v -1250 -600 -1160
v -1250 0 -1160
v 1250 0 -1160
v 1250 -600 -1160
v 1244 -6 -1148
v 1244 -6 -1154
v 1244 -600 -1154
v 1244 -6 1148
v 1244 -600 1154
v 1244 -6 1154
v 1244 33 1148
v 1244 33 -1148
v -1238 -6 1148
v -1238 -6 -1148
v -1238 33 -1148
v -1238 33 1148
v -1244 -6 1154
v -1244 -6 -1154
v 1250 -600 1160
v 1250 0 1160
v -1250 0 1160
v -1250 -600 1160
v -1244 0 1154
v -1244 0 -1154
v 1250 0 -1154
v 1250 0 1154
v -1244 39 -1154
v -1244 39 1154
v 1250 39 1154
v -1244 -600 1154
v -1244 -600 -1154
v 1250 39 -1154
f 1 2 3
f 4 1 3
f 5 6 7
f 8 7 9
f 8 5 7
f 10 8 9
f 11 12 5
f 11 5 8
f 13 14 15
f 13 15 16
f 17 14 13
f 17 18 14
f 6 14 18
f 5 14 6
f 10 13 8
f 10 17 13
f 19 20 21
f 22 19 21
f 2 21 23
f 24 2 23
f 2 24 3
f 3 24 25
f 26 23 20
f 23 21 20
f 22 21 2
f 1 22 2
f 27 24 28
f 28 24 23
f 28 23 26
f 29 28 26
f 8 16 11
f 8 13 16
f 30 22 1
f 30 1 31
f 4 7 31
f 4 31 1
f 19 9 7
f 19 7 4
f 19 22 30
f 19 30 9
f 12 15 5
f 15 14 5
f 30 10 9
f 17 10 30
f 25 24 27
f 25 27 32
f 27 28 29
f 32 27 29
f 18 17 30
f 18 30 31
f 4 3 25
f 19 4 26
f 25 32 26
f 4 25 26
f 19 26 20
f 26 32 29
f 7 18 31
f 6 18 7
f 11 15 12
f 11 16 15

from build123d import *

# Parameters (mm, degrees)
F2_DEPTH = 6
F3_W     = 2494
F3_H     = 2308
F4_DEPTH = 45
F5_DEPTH = 600
F6_T     = -6


with BuildPart() as f2:
    # F0 (on Front) → F2 (new body)
    with BuildSketch(Plane.XZ):
        Polygon((-1250, 1160), (-1250, 677.0832676902), (-1250, -677.0832676902), (-1250, -1160), (1250, -1160), (1250, -677.0832676902), (1250, 677.0832676902), (1250, 1160), align=None)
    extrude(amount=F2_DEPTH)

    # F3 (on face) → F4 (join)
    with BuildSketch(Plane.XZ.offset(6)):
        with Locations((3, 0)):
            Rectangle(F3_W, F3_H)
    extrude(amount=-F4_DEPTH)

    # F0 (on Front) → F5 (join)
    with BuildSketch(Plane.XZ):
        Polygon((-1250, 1160), (-1250, 677.0832676902), (-1250, -677.0832676902), (-1250, -1160), (1250, -1160), (1250, -677.0832676902), (1250, 677.0832676902), (1250, 1160), align=None)
    extrude(amount=F5_DEPTH)

    # F6
    f6_openings = [f2.faces().sort_by_distance(p)[0] for p in [
        (0, -600, 0),
    ]]
    offset(amount=F6_T, openings=f6_openings, kind=Kind.INTERSECTION)


solid = f2.part
